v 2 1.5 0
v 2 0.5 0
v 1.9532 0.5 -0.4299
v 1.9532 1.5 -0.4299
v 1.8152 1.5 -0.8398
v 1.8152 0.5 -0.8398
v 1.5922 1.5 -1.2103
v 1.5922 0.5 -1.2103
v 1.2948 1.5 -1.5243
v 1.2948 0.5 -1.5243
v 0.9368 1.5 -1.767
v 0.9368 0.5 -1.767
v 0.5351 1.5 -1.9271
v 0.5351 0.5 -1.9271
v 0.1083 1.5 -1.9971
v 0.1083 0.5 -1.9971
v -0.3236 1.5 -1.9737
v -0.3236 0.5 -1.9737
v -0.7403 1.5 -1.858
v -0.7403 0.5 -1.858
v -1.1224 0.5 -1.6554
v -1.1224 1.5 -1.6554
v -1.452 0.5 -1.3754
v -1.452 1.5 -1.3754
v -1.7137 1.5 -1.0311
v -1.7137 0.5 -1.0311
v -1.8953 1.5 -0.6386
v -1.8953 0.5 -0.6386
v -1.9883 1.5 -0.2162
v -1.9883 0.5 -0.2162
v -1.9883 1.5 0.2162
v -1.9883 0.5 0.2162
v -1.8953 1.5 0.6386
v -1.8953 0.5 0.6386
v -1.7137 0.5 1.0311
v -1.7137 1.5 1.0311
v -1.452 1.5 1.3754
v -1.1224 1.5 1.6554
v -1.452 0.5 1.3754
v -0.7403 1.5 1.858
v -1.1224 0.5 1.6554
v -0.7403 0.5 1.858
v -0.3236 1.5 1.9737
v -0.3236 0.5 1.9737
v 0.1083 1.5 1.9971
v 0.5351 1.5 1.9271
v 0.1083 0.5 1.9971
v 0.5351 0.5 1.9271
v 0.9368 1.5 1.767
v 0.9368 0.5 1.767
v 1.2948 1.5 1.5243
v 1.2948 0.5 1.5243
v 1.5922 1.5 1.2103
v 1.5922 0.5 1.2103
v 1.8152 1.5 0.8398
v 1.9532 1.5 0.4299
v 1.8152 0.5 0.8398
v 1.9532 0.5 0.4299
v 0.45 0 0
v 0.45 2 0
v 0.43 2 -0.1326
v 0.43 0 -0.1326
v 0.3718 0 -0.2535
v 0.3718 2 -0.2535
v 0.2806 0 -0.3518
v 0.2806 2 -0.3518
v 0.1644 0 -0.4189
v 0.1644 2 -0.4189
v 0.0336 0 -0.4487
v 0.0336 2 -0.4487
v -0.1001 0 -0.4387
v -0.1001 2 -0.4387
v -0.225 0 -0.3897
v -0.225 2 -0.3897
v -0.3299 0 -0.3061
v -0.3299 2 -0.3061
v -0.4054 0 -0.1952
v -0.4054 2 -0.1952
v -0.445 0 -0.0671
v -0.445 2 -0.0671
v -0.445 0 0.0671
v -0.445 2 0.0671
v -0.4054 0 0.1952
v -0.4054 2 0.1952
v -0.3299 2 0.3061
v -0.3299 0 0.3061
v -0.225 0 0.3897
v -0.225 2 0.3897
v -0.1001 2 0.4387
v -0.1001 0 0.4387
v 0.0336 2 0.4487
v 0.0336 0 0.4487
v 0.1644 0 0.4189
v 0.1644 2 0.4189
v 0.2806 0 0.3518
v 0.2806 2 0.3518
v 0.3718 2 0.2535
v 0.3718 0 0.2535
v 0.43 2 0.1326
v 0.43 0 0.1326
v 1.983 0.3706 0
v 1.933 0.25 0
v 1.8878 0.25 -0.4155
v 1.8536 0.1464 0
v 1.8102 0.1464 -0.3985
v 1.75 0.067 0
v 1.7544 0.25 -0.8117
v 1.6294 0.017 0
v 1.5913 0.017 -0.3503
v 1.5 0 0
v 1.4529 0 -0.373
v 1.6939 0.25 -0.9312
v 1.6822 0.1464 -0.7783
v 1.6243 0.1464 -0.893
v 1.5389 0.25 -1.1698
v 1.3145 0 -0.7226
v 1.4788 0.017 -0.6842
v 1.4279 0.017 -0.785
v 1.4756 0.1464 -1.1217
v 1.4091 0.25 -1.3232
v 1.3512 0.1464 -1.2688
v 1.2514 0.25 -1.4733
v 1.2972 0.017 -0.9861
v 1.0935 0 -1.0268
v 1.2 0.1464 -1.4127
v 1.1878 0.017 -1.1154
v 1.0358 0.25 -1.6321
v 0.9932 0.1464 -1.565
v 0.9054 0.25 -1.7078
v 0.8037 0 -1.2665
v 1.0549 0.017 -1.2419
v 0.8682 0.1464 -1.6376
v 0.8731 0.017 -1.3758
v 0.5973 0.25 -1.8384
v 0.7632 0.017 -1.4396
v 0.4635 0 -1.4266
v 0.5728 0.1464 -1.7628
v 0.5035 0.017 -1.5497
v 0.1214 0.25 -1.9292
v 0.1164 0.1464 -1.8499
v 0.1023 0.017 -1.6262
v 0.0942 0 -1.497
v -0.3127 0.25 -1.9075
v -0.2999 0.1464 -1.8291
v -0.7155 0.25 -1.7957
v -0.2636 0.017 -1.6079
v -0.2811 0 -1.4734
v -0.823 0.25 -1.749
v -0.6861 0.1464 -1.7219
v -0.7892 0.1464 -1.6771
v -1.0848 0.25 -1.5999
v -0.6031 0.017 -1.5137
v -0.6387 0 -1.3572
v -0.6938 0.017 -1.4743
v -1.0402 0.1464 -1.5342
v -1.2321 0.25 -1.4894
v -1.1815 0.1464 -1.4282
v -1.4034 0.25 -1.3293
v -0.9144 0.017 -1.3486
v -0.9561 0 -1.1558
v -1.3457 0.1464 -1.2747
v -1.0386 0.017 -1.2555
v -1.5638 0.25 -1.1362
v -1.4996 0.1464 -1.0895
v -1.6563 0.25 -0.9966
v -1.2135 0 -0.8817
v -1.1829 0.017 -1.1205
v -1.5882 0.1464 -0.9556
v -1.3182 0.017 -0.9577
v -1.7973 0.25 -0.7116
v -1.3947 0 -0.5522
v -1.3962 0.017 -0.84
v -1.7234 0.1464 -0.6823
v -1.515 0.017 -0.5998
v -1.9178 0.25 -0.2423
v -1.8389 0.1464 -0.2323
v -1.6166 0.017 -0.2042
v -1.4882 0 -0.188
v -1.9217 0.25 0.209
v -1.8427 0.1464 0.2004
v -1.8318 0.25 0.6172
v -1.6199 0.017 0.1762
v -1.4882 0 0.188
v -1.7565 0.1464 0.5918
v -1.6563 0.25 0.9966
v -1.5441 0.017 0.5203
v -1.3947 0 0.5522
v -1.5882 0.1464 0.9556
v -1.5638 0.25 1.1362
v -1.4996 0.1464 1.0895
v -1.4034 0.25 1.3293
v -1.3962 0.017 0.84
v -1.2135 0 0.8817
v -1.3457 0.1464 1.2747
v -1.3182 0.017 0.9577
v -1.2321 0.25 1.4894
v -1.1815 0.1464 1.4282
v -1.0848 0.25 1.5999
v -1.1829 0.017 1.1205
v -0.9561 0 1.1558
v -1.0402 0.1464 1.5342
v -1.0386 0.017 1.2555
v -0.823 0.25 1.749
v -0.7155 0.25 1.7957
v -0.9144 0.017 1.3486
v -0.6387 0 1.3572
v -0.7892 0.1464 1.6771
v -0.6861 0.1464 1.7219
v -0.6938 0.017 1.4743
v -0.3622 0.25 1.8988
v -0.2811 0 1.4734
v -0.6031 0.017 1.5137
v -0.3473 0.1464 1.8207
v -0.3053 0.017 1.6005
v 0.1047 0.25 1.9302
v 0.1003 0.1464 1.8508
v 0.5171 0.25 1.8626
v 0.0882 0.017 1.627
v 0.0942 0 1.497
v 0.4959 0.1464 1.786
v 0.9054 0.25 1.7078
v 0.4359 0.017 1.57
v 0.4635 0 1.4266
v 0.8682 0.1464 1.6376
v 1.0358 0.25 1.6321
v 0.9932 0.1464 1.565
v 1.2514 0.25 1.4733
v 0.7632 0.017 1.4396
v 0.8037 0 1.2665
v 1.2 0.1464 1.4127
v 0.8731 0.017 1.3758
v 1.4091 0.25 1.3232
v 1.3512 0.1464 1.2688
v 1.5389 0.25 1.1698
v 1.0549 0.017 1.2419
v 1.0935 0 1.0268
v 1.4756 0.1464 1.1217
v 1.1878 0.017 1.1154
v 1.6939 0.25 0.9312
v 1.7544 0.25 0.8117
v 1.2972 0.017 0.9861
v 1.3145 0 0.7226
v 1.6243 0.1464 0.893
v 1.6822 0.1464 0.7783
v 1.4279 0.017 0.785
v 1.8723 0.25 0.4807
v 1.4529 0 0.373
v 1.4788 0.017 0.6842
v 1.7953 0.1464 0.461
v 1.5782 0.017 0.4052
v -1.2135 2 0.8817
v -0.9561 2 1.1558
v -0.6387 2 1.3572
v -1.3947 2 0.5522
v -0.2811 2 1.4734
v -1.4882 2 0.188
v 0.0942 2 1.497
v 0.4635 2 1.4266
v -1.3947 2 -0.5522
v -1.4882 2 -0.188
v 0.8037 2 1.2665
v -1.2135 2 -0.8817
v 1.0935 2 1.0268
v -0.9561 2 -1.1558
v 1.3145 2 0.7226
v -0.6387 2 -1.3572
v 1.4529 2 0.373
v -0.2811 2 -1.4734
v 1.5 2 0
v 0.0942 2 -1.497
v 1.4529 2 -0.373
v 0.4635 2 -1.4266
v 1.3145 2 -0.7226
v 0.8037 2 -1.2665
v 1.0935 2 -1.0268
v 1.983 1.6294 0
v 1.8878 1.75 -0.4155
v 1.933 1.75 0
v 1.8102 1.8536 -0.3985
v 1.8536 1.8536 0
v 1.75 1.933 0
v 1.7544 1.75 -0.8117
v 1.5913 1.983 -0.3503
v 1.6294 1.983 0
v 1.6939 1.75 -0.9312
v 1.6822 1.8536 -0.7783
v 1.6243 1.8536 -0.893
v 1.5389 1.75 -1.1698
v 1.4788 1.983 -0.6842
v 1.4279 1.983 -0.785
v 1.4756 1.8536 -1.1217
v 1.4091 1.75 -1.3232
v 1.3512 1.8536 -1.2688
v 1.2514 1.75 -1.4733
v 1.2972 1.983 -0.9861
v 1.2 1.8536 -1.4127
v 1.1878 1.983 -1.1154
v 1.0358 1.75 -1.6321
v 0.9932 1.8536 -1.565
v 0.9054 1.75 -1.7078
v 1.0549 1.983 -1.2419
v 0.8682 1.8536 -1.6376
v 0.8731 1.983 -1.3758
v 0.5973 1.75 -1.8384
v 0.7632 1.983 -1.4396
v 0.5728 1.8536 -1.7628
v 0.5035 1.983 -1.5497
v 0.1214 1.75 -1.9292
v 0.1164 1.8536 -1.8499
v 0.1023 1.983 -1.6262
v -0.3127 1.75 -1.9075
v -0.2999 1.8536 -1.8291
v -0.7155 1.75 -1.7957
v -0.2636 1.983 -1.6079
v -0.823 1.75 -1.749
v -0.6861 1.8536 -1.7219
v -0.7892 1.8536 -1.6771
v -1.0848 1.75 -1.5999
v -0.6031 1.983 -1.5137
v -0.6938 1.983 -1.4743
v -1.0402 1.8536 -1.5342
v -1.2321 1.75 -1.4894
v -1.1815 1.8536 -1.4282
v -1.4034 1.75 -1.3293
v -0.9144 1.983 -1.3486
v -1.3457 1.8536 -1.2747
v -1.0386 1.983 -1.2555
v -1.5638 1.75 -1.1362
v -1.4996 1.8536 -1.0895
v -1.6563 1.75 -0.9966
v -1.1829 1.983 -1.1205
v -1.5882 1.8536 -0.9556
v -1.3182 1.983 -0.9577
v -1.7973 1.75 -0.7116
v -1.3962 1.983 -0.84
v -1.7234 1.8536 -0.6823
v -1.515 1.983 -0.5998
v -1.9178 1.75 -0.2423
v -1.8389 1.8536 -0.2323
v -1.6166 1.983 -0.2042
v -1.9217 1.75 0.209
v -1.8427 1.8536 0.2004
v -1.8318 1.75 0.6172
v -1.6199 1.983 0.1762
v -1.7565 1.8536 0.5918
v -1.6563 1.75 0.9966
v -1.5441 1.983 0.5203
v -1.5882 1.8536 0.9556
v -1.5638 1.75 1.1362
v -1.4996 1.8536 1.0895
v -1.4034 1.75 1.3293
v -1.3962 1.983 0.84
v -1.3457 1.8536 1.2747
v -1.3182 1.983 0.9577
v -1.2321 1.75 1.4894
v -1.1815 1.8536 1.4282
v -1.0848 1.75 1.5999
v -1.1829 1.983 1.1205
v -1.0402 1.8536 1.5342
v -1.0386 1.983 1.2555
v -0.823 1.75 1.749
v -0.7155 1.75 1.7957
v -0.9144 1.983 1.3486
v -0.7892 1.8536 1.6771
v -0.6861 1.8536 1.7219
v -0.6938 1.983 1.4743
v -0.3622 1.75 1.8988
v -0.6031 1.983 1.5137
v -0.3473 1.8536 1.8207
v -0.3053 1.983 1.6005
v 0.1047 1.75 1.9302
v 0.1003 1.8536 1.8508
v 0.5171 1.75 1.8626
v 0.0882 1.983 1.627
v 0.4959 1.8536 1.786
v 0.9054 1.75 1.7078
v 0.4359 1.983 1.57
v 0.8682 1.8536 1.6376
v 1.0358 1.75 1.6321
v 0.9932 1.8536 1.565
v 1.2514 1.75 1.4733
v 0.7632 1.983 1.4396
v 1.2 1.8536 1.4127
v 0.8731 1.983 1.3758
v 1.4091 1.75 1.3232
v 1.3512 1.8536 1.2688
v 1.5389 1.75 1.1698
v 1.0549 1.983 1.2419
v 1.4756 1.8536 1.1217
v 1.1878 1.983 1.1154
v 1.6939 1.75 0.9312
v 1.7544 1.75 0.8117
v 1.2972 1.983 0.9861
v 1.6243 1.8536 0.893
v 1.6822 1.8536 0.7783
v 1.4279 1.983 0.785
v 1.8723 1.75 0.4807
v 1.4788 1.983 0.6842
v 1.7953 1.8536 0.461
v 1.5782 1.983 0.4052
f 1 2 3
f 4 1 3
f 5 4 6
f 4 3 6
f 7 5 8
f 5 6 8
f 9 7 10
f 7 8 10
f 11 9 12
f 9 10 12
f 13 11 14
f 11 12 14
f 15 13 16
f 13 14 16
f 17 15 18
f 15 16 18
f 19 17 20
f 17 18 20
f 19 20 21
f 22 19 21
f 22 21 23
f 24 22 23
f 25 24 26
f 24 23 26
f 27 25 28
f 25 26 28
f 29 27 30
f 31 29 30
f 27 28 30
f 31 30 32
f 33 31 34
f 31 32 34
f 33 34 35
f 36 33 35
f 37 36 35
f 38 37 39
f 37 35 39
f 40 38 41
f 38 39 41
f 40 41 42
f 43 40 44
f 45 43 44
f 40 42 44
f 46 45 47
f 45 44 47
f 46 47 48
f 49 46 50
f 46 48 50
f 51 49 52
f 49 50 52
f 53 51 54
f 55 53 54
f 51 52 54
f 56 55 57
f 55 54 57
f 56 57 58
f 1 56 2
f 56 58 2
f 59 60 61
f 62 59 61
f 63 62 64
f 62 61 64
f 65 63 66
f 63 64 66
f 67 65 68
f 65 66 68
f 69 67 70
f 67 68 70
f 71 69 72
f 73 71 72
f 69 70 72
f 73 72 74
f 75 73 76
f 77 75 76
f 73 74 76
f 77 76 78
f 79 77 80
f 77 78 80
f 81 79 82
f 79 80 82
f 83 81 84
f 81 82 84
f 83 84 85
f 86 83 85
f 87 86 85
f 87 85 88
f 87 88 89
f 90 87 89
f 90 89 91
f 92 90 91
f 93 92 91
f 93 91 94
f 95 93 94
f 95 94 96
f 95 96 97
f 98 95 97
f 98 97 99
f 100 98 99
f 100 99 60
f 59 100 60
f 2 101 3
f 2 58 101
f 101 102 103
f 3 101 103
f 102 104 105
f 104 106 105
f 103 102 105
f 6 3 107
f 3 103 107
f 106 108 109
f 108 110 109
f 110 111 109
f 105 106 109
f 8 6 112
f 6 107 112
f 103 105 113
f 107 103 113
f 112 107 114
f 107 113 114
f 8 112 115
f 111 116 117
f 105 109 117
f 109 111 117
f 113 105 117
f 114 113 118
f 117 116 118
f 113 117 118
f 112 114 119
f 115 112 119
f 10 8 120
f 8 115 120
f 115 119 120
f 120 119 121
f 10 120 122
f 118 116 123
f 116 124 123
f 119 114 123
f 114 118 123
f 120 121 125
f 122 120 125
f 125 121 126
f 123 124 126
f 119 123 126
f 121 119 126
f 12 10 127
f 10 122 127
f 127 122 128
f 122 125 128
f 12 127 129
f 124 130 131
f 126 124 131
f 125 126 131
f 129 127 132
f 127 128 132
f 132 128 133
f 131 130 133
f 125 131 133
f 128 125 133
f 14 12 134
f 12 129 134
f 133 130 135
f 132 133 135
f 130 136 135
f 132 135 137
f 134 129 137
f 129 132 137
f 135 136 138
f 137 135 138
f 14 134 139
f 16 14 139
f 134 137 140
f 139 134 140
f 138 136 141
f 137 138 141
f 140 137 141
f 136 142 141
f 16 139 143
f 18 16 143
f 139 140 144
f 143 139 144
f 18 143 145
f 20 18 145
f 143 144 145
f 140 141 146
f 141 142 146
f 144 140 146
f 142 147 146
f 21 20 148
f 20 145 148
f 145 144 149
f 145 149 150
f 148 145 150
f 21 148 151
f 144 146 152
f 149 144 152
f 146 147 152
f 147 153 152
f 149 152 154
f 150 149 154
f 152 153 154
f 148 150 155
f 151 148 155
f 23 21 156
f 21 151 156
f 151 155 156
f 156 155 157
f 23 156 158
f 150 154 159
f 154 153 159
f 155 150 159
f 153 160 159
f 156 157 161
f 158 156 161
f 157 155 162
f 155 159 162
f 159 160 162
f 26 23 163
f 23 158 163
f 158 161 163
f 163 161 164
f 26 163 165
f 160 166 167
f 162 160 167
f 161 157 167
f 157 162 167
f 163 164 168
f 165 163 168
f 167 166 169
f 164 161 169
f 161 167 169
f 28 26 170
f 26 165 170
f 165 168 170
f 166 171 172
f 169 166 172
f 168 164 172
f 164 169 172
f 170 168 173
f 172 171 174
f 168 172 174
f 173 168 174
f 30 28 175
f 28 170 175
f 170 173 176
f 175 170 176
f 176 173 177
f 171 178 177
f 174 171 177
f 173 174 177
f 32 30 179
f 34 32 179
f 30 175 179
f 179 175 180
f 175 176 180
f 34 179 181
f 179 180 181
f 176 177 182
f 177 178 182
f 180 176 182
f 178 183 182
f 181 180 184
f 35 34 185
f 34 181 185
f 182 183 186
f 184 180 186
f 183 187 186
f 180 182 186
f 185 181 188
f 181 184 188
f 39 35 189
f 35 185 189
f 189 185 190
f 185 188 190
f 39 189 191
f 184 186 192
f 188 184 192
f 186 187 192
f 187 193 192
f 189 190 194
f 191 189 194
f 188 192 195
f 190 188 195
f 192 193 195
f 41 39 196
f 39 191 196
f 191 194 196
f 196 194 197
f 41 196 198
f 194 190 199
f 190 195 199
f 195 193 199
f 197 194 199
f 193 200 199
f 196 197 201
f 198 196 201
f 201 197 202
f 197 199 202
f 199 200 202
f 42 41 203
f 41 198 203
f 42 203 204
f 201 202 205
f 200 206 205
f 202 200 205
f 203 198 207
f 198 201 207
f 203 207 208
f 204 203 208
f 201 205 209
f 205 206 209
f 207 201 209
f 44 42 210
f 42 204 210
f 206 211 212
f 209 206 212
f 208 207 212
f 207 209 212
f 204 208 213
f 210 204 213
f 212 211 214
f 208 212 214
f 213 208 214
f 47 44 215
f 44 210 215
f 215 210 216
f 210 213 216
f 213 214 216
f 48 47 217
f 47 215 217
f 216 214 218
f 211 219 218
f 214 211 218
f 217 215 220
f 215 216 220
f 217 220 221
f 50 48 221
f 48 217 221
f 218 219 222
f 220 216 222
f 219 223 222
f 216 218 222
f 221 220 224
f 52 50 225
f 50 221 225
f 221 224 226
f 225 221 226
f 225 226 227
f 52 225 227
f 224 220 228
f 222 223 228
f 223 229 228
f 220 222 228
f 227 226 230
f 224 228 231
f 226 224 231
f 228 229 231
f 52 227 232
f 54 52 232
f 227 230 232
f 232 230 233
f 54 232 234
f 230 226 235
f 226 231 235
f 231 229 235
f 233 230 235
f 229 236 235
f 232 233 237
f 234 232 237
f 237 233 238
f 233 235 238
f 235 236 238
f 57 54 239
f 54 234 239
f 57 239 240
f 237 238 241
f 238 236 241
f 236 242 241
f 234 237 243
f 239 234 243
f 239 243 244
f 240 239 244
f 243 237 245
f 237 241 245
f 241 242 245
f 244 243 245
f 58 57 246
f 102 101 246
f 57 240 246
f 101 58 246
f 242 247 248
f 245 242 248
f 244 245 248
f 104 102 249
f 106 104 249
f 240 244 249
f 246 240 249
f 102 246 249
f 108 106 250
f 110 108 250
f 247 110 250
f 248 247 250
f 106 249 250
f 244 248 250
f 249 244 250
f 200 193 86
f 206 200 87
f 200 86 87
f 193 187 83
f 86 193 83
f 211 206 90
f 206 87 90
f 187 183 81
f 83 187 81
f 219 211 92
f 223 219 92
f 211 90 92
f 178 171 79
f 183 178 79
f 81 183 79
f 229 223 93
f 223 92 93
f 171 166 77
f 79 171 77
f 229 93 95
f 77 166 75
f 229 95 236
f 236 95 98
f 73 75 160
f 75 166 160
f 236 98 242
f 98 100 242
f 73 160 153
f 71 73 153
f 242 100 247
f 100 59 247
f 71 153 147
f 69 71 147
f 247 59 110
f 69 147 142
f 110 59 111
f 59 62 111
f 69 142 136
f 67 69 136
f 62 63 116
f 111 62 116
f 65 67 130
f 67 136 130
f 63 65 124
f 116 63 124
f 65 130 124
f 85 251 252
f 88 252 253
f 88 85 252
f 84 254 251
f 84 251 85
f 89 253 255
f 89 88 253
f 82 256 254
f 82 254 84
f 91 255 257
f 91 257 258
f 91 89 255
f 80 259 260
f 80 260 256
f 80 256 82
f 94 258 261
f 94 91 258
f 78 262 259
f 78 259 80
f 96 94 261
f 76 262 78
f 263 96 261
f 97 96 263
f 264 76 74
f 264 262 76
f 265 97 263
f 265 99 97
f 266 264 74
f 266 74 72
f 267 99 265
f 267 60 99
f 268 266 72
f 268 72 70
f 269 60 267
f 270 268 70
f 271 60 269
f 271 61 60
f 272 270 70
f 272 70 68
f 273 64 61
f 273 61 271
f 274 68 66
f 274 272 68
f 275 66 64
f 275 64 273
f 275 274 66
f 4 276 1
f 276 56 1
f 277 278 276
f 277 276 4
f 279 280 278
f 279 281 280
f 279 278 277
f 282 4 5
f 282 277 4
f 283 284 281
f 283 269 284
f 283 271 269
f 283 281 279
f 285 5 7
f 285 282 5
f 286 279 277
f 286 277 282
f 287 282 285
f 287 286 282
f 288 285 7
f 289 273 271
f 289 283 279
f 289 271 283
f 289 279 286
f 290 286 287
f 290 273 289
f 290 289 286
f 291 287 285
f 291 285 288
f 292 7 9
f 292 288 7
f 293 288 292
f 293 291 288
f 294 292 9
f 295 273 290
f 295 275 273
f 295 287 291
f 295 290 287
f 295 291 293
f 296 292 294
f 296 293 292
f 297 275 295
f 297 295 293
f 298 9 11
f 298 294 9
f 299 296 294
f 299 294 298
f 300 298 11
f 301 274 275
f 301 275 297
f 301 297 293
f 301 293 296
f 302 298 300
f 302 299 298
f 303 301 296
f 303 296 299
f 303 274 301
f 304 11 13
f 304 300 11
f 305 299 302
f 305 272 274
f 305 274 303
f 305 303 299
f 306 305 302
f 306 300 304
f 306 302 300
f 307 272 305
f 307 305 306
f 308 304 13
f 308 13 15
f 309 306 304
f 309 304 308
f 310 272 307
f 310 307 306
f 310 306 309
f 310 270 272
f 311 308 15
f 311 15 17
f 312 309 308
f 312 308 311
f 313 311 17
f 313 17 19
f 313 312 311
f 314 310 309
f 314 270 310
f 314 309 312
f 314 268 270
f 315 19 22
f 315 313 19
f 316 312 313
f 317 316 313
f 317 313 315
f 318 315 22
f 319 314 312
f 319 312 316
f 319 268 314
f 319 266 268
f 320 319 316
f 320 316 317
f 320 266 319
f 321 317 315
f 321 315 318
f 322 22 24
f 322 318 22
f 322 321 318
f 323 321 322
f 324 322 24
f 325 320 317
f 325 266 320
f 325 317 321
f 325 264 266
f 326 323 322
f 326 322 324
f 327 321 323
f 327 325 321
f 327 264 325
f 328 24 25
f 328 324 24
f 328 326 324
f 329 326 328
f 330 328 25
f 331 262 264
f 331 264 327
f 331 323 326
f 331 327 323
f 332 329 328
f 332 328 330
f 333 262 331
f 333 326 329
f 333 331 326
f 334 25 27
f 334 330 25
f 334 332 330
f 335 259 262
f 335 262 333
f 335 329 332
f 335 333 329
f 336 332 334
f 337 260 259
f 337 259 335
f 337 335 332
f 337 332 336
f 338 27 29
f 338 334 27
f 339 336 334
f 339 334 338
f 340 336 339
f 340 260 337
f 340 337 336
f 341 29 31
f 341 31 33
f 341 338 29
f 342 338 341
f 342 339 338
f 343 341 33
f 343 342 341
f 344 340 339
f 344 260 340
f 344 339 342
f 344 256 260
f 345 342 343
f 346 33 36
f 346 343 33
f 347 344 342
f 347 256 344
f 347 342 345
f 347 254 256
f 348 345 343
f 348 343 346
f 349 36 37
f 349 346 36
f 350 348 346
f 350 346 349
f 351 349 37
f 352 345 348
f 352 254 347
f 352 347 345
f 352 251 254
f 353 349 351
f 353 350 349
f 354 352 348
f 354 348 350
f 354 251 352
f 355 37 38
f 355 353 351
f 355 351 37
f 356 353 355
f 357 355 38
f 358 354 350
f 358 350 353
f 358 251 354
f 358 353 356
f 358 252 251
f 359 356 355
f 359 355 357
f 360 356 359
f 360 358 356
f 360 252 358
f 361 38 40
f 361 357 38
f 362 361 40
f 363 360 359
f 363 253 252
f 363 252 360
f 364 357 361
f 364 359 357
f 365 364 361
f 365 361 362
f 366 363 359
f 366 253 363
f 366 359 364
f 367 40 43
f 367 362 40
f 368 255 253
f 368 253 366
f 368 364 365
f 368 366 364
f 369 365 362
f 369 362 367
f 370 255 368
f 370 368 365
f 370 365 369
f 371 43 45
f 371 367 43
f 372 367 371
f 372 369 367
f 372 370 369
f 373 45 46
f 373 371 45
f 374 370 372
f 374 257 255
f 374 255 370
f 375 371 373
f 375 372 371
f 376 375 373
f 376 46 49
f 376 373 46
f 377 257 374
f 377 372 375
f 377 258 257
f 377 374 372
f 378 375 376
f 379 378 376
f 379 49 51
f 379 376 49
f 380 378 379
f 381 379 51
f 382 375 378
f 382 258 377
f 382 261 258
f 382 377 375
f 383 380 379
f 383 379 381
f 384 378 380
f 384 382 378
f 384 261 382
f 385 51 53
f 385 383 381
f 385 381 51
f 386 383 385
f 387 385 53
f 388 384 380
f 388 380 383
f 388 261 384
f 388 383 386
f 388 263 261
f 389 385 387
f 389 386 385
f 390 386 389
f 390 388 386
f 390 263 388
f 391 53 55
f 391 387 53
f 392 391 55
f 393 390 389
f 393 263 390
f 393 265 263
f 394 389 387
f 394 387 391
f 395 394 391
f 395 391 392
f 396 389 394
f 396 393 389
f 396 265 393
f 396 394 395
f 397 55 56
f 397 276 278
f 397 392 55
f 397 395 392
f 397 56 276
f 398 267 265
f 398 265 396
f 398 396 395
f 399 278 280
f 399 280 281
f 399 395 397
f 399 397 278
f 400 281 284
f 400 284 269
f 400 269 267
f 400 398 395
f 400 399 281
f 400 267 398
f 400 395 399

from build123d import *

# Parameters (mm, degrees)
SKETCH_1_R          = 2
EXTRUDE_1_DEPTH     = 2
SKETCH_2_R          = 0.45
CUT_EXTRUDE_1_DEPTH = 3
FILLET_1_R          = 0.5


with BuildPart() as part:
    # 草图1 → 凸台-拉伸1 (new body)
    with BuildSketch(Plane(origin=(0, 0, 0), x_dir=(1, 0, 0), z_dir=(0, 1, 0))):
        Circle(SKETCH_1_R)
    extrude(amount=EXTRUDE_1_DEPTH)

    # 草图2 → 切除-拉伸1 (cut, through all)
    with BuildSketch(Plane(origin=(0, 2, 0), x_dir=(1, 0, 0), z_dir=(0, 1, 0))):
        Circle(SKETCH_2_R)
    extrude(amount=-CUT_EXTRUDE_1_DEPTH, mode=Mode.SUBTRACT)

    # 圆角1
    fillet_1_edges = [part.edges().sort_by_distance(p)[0] for p in [
        (-2, 0, 0),
        (-2, 2, 0),
    ]]
    fillet(fillet_1_edges, radius=FILLET_1_R)


solid = part.part
